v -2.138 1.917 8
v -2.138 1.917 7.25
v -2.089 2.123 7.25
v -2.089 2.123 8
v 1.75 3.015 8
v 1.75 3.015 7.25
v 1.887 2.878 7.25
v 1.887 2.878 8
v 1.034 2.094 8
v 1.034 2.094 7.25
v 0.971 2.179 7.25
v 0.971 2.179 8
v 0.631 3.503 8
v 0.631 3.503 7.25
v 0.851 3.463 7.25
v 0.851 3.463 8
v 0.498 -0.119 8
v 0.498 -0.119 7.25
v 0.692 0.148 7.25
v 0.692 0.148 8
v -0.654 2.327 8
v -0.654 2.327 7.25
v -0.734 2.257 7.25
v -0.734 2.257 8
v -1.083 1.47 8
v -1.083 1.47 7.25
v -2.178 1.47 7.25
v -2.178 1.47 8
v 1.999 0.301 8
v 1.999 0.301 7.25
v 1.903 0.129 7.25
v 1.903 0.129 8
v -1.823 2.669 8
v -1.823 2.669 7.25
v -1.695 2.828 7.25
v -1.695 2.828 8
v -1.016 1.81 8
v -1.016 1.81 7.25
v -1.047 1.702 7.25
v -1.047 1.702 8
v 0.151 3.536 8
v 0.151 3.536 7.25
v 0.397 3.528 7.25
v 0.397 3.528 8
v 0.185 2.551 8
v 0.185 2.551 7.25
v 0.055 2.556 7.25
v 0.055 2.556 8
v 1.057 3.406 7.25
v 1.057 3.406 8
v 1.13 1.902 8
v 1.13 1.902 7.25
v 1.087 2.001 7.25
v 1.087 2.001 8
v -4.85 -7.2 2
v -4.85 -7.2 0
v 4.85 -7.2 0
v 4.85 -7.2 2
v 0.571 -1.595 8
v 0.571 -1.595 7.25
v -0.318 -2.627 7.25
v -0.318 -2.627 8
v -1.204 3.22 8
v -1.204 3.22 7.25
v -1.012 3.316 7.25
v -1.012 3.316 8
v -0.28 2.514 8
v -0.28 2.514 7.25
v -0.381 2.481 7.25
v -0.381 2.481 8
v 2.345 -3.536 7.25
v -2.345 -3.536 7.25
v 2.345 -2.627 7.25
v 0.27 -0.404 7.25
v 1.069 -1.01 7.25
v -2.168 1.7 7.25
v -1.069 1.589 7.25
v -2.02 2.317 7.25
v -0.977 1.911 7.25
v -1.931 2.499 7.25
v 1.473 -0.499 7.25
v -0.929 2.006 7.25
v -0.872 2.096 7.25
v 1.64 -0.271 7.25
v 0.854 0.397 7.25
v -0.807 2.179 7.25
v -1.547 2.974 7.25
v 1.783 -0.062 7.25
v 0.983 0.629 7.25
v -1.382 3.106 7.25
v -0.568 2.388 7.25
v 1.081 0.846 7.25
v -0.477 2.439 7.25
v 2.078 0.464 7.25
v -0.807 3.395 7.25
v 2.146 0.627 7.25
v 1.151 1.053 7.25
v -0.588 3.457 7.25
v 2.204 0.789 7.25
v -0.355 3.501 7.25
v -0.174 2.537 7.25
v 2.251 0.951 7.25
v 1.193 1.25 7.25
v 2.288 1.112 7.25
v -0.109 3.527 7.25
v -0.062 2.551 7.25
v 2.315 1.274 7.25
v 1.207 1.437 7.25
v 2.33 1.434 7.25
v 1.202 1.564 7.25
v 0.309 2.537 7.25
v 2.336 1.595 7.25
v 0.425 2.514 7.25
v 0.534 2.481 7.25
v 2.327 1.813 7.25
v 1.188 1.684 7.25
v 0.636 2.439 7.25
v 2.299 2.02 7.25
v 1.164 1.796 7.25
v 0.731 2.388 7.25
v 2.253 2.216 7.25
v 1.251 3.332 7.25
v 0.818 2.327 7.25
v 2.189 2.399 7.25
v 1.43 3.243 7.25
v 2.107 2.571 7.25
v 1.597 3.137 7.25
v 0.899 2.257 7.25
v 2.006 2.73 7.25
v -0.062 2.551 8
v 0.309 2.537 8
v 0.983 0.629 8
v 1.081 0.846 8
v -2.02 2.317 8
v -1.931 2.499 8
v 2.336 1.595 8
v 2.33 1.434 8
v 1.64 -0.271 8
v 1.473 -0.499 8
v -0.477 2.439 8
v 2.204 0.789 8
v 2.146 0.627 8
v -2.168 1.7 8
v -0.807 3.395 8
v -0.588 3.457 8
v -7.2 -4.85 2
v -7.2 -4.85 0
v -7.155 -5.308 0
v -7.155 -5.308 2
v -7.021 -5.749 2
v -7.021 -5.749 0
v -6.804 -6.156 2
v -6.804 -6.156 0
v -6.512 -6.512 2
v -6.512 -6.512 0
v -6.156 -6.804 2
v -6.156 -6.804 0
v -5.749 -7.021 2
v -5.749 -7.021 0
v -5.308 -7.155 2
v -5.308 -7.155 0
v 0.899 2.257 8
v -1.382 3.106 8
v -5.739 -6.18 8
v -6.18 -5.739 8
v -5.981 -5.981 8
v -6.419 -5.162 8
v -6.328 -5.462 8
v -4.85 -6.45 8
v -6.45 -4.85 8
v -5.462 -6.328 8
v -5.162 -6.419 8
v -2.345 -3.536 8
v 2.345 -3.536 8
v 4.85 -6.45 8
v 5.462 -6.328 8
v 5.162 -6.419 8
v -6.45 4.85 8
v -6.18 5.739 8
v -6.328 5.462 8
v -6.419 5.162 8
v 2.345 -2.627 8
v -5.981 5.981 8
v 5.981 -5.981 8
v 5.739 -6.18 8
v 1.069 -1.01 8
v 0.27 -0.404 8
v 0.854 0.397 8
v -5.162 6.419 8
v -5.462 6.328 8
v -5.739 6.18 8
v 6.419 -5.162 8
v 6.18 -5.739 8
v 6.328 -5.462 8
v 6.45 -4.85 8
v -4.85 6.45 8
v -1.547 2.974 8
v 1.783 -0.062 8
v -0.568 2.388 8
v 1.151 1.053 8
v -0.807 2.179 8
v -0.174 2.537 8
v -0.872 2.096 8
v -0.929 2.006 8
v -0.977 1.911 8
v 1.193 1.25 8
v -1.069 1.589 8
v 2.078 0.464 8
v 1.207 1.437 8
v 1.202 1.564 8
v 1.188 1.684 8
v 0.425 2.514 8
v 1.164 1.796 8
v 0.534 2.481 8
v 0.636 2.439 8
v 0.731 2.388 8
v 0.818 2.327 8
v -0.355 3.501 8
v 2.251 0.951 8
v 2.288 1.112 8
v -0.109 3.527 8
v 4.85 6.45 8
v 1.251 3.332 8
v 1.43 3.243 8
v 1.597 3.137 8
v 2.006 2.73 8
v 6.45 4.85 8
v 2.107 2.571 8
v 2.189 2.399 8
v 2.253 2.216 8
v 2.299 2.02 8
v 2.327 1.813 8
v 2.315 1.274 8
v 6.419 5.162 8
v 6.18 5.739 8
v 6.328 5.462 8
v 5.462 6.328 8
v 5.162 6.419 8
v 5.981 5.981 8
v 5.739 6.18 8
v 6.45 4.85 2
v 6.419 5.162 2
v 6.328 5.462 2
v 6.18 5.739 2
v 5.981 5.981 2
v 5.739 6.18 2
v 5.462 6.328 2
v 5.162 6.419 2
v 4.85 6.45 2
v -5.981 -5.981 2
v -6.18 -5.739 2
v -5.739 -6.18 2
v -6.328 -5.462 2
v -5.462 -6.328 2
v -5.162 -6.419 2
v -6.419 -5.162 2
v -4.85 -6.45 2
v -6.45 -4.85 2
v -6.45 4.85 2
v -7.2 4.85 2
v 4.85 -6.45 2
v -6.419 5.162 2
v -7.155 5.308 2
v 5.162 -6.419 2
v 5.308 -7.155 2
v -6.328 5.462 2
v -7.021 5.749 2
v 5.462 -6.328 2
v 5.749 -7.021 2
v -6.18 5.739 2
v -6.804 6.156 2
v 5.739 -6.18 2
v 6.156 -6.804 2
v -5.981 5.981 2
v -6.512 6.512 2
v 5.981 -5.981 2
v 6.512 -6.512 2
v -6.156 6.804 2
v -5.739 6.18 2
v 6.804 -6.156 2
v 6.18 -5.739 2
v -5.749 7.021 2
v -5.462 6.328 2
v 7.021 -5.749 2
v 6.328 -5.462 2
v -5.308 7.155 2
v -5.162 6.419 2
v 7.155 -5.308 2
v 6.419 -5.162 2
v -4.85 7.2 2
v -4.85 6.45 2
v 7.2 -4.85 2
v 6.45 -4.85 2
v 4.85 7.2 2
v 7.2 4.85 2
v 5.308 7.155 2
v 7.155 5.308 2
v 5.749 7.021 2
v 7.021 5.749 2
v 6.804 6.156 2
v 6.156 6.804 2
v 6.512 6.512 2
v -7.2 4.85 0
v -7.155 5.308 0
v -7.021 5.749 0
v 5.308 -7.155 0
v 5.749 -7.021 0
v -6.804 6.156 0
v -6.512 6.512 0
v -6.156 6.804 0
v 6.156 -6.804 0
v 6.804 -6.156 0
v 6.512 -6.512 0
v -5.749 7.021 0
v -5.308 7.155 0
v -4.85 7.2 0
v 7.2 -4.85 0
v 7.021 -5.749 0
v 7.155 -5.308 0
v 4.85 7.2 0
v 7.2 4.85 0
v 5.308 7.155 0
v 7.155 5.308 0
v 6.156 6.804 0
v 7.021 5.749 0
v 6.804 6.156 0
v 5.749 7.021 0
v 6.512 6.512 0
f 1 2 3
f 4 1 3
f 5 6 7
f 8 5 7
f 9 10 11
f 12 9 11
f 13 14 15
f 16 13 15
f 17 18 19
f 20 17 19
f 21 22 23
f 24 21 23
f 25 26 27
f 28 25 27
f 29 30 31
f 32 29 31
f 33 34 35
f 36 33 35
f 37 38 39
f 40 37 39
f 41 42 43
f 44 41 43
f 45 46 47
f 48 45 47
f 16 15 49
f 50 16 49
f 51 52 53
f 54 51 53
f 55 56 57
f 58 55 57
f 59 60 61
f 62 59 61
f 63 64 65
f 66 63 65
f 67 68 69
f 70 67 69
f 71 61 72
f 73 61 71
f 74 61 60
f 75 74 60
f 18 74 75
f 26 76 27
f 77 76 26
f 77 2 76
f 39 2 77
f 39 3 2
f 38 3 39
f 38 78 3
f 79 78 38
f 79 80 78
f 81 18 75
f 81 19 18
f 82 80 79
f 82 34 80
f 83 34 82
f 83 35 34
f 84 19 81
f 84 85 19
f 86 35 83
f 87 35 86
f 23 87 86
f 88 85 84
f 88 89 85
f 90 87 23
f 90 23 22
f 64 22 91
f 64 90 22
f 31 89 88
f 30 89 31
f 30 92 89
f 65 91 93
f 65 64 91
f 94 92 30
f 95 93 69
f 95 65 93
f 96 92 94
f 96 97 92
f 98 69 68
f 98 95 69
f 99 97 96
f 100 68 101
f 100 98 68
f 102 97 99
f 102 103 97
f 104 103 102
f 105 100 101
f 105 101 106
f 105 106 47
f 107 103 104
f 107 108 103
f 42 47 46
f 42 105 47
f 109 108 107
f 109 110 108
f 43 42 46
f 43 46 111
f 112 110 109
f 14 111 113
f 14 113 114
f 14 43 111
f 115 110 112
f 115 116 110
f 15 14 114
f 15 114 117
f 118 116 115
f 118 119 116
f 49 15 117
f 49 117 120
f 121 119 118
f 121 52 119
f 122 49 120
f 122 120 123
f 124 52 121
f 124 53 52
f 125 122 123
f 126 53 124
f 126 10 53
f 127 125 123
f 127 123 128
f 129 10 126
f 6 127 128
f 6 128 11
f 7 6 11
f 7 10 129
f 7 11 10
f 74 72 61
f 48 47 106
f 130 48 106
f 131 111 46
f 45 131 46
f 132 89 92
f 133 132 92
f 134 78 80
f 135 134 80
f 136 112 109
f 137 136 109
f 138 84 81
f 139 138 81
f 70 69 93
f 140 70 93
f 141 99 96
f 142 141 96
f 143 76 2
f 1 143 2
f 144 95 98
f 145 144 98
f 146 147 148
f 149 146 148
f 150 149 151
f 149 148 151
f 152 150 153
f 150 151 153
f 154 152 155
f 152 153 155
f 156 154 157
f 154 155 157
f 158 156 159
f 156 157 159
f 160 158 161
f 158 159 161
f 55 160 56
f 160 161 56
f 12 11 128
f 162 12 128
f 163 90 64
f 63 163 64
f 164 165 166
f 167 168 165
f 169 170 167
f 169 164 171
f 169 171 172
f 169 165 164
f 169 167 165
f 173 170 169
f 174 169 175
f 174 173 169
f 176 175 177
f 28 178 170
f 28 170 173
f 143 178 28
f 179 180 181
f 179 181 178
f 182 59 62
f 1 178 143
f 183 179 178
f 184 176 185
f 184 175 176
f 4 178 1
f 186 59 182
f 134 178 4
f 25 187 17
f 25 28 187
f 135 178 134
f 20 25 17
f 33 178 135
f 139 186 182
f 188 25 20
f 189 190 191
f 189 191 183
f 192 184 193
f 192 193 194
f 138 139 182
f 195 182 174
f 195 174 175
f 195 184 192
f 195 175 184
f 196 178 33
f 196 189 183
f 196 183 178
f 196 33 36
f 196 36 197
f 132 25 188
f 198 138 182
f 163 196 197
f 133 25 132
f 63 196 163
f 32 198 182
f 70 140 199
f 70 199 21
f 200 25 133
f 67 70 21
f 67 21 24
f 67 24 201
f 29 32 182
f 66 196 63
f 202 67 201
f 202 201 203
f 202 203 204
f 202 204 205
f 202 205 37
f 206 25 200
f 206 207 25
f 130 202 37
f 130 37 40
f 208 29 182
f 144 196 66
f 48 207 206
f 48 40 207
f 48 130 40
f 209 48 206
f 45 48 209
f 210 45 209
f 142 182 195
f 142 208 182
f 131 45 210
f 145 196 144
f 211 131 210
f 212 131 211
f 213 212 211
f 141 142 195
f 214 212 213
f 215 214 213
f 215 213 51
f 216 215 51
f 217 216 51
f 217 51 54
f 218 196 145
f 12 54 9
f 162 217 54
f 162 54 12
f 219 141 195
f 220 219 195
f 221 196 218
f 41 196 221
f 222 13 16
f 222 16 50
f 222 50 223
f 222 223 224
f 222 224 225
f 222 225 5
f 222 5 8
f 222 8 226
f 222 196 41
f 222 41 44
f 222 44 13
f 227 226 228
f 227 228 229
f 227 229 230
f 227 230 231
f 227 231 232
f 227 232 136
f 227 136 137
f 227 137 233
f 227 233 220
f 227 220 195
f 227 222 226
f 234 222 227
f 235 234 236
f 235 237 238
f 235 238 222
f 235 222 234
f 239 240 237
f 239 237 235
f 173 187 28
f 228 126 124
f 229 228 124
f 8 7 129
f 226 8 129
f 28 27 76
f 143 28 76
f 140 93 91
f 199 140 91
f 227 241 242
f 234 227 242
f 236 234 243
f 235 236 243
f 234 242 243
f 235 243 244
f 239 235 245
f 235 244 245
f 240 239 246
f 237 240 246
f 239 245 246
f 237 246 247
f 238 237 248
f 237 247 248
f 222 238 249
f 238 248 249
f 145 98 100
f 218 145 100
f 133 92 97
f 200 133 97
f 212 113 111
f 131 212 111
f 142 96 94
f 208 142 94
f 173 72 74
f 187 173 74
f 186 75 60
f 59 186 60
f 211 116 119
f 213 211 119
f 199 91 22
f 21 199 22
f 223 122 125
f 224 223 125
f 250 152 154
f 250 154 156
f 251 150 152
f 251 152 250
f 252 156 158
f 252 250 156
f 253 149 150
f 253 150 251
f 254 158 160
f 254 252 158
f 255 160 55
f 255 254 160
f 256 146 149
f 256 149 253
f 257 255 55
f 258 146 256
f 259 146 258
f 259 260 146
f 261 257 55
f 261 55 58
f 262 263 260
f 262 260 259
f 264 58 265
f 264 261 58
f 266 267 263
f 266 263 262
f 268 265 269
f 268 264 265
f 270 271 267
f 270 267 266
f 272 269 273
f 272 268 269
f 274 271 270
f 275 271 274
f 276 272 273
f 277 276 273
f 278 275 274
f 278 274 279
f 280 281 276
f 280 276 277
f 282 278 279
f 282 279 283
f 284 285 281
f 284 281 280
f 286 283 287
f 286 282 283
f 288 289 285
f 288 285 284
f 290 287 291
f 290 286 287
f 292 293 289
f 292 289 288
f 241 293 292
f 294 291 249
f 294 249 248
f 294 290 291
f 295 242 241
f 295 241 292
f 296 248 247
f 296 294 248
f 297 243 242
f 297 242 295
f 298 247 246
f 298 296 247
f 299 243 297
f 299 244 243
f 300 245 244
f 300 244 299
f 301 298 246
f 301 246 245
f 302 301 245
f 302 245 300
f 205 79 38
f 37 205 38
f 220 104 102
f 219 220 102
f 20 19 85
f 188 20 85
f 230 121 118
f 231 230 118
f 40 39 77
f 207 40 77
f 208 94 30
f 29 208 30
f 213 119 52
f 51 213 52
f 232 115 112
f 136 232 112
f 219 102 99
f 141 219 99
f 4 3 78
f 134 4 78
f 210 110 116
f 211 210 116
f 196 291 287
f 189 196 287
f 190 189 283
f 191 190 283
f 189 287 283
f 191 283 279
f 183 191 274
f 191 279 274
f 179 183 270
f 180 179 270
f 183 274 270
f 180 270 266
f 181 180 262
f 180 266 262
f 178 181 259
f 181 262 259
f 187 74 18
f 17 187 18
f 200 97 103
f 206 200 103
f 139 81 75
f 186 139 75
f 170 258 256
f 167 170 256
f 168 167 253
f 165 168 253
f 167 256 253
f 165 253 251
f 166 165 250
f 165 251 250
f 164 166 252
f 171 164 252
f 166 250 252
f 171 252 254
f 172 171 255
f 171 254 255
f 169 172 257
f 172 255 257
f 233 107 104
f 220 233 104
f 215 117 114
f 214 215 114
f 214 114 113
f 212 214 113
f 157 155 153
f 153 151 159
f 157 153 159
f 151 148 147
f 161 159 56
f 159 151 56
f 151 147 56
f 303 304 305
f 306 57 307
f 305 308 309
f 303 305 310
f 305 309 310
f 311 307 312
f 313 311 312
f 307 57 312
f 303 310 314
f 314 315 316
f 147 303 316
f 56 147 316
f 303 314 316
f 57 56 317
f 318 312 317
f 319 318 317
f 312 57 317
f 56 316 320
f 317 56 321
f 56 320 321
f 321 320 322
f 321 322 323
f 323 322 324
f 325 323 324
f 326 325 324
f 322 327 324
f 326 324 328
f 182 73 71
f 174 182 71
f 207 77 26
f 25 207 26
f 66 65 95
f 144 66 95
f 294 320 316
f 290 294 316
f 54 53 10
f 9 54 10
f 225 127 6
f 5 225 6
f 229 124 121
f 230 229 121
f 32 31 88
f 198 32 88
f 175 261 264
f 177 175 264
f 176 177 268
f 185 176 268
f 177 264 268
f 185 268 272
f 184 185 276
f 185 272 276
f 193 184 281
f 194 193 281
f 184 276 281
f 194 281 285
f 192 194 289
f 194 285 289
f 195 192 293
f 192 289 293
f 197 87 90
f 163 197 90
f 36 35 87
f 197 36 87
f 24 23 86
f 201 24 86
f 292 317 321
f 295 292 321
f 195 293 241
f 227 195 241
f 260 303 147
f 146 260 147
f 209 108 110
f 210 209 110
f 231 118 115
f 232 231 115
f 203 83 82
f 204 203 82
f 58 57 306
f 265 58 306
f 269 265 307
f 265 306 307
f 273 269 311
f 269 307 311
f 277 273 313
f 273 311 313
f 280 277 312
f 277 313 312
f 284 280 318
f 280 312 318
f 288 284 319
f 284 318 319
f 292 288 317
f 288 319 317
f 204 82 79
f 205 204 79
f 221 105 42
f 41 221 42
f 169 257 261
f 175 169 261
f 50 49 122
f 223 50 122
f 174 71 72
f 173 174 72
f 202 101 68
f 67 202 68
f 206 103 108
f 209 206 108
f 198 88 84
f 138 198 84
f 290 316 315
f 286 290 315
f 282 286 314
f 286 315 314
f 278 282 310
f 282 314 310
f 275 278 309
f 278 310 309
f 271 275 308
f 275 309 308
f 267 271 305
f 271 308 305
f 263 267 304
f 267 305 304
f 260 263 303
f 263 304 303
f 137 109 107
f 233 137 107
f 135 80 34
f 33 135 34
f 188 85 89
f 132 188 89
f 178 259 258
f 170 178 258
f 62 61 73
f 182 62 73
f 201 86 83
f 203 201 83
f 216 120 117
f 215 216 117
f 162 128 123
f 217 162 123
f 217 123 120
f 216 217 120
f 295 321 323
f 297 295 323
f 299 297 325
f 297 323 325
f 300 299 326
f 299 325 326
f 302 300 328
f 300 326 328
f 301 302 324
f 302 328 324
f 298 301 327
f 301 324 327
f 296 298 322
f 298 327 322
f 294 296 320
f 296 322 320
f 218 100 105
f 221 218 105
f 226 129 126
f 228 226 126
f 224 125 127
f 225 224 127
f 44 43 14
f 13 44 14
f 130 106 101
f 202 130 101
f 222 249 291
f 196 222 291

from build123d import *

# Parameters (mm, degrees)
F1_DEPTH = 2
F2_DEPTH = 8
F3_DEPTH = 7.25


with BuildPart() as f1:
    # F0 (on Top) → F1 (new body)
    with BuildSketch(Plane.XY):
        with BuildLine():
            Line((4.85, 7.2), (-4.85, 7.2))
            ThreePointArc((-4.85, 7.2), (-6.511701, 6.511701), (-7.2, 4.85))
            Line((-7.2, 4.85), (-7.2, -4.85))
            ThreePointArc((-7.2, -4.85), (-6.511701, -6.511701), (-4.85, -7.2))
            Line((-4.85, -7.2), (4.85, -7.2))
            ThreePointArc((4.85, -7.2), (6.511701, -6.511701), (7.2, -4.85))
            Line((7.2, -4.85), (7.2, 4.85))
            ThreePointArc((7.2, 4.85), (6.511701, 6.511701), (4.85, 7.2))
        make_face()
        with BuildLine():
            ThreePointArc((6.45, -4.85), (5.981371, -5.981371), (4.85, -6.45))
            Line((4.85, -6.45), (-4.85, -6.45))
            ThreePointArc((-4.85, -6.45), (-5.981371, -5.981371), (-6.45, -4.85))
            Line((-6.45, -4.85), (-6.45, 4.85))
            ThreePointArc((-6.45, 4.85), (-5.981371, 5.981371), (-4.85, 6.45))
            Line((-4.85, 6.45), (4.85, 6.45))
            ThreePointArc((4.85, 6.45), (5.981371, 5.981371), (6.45, 4.85))
            Line((6.45, 4.85), (6.45, -4.85))
        make_face(mode=Mode.SUBTRACT)
    extrude(amount=F1_DEPTH)

    # F0 (on Top) → F2 (join)
    with BuildSketch(Plane.XY):
        with BuildLine():
            Line((-4.85, -6.45), (4.85, -6.45))
            ThreePointArc((4.85, -6.45), (5.981371, -5.981371), (6.45, -4.85))
            Line((6.45, -4.85), (6.45, 4.85))
            ThreePointArc((6.45, 4.85), (5.981371, 5.981371), (4.85, 6.45))
            Line((4.85, 6.45), (-4.85, 6.45))
            ThreePointArc((-4.85, 6.45), (-5.981371, 5.981371), (-6.45, 4.85))
            Line((-6.45, 4.85), (-6.45, -4.85))
            ThreePointArc((-6.45, -4.85), (-5.981371, -5.981371), (-4.85, -6.45))
        make_face()
        Polygon((-0.317964, -2.627391), (2.345287, -2.627391), (2.345287, -3.535861), (-2.345287, -3.535861), (0.27015, -0.40403), (0.497567, -0.118938), (0.692111, 0.148224), (0.853782, 0.397456), (0.982582, 0.628757), (1.0809, 0.846013), (1.151127, 1.053108), (1.193263, 1.250043), (1.207309, 1.436817), (1.20249, 1.563637), (1.188034, 1.683508), (1.16394, 1.796432), (1.130208, 1.902408), (1.086839, 2.001435), (1.033833, 2.093515), (0.971189, 2.178647), (0.898907, 2.256831), (0.818258, 2.326871), (0.730511, 2.387573), (0.635667, 2.438935), (0.533726, 2.48096), (0.424687, 2.513645), (0.308551, 2.536992), (0.185317, 2.551), (0.054986, 2.555669), (-0.061934, 2.551), (-0.173625, 2.536992), (-0.280087, 2.513645), (-0.381318, 2.48096), (-0.47732, 2.438935), (-0.568093, 2.387573), (-0.653635, 2.326871), (-0.733948, 2.256831), (-0.807388, 2.17917), (-0.87231, 2.095607), (-0.928716, 2.006142), (-0.976605, 1.910775), (-1.015977, 1.809506), (-1.046832, 1.702335), (-1.069171, 1.589262), (-1.082992, 1.470287), (-2.177937, 1.470287), (-2.168075, 1.699832), (-2.13849, 1.917499), (-2.089182, 2.123287), (-2.02015, 2.317196), (-1.931395, 2.499226), (-1.822917, 2.669378), (-1.694715, 2.82765), (-1.54679, 2.974044), (-1.382204, 3.10572), (-1.204022, 3.219839), (-1.012242, 3.316401), (-0.806865, 3.395406), (-0.587891, 3.456855), (-0.355319, 3.500747), (-0.109151, 3.527082), (0.150615, 3.535861), (0.397344, 3.527717), (0.630699, 3.503287), (0.850682, 3.46257), (1.057292, 3.405567), (1.250528, 3.332277), (1.430392, 3.2427), (1.596882, 3.136836), (1.75, 3.014686), (1.887279, 2.87849), (2.006254, 2.73049), (2.106926, 2.570686), (2.189293, 2.399078), (2.253357, 2.215666), (2.299116, 2.020449), (2.326572, 1.813429), (2.335724, 1.594604), (2.330457, 1.434239), (2.314656, 1.273502), (2.288321, 1.11239), (2.251452, 0.950905), (2.204048, 0.789046), (2.146111, 0.626814), (2.077639, 0.464209), (1.998634, 0.30123), (1.902595, 0.128837), (1.783022, -0.062009), (1.639915, -0.271308), (1.473275, -0.499061), (1.069395, -1.009926), (0.57138, -1.594604), align=None, mode=Mode.SUBTRACT)
    extrude(amount=F2_DEPTH)

    # F0 (on Top) → F3 (join)
    with BuildSketch(Plane.XY):
        Polygon((2.345287, -3.535861), (2.345287, -2.627391), (-0.317964, -2.627391), (0.57138, -1.594604), (1.069395, -1.009926), (1.473275, -0.499061), (1.639915, -0.271308), (1.783022, -0.062009), (1.902595, 0.128837), (1.998634, 0.30123), (2.077639, 0.464209), (2.146111, 0.626814), (2.204048, 0.789046), (2.251452, 0.950905), (2.288321, 1.11239), (2.314656, 1.273502), (2.330457, 1.434239), (2.335724, 1.594604), (2.326572, 1.813429), (2.299116, 2.020449), (2.253357, 2.215666), (2.189293, 2.399078), (2.106926, 2.570686), (2.006254, 2.73049), (1.887279, 2.87849), (1.75, 3.014686), (1.596882, 3.136836), (1.430392, 3.2427), (1.250528, 3.332277), (1.057292, 3.405567), (0.850682, 3.46257), (0.630699, 3.503287), (0.397344, 3.527717), (0.150615, 3.535861), (-0.109151, 3.527082), (-0.355319, 3.500747), (-0.587891, 3.456855), (-0.806865, 3.395406), (-1.012242, 3.316401), (-1.204022, 3.219839), (-1.382204, 3.10572), (-1.54679, 2.974044), (-1.694715, 2.82765), (-1.822917, 2.669378), (-1.931395, 2.499226), (-2.02015, 2.317196), (-2.089182, 2.123287), (-2.13849, 1.917499), (-2.168075, 1.699832), (-2.177937, 1.470287), (-1.082992, 1.470287), (-1.069171, 1.589262), (-1.046832, 1.702335), (-1.015977, 1.809506), (-0.976605, 1.910775), (-0.928716, 2.006142), (-0.87231, 2.095607), (-0.807388, 2.17917), (-0.733948, 2.256831), (-0.653635, 2.326871), (-0.568093, 2.387573), (-0.47732, 2.438935), (-0.381318, 2.48096), (-0.280087, 2.513645), (-0.173625, 2.536992), (-0.061934, 2.551), (0.054986, 2.555669), (0.185317, 2.551), (0.308551, 2.536992), (0.424687, 2.513645), (0.533726, 2.48096), (0.635667, 2.438935), (0.730511, 2.387573), (0.818258, 2.326871), (0.898907, 2.256831), (0.971189, 2.178647), (1.033833, 2.093515), (1.086839, 2.001435), (1.130208, 1.902408), (1.16394, 1.796432), (1.188034, 1.683508), (1.20249, 1.563637), (1.207309, 1.436817), (1.193263, 1.250043), (1.151127, 1.053108), (1.0809, 0.846013), (0.982582, 0.628757), (0.853782, 0.397456), (0.692111, 0.148224), (0.497567, -0.118938), (0.27015, -0.40403), (-2.345287, -3.535861), align=None)
    extrude(amount=F3_DEPTH)


solid = f1.part
